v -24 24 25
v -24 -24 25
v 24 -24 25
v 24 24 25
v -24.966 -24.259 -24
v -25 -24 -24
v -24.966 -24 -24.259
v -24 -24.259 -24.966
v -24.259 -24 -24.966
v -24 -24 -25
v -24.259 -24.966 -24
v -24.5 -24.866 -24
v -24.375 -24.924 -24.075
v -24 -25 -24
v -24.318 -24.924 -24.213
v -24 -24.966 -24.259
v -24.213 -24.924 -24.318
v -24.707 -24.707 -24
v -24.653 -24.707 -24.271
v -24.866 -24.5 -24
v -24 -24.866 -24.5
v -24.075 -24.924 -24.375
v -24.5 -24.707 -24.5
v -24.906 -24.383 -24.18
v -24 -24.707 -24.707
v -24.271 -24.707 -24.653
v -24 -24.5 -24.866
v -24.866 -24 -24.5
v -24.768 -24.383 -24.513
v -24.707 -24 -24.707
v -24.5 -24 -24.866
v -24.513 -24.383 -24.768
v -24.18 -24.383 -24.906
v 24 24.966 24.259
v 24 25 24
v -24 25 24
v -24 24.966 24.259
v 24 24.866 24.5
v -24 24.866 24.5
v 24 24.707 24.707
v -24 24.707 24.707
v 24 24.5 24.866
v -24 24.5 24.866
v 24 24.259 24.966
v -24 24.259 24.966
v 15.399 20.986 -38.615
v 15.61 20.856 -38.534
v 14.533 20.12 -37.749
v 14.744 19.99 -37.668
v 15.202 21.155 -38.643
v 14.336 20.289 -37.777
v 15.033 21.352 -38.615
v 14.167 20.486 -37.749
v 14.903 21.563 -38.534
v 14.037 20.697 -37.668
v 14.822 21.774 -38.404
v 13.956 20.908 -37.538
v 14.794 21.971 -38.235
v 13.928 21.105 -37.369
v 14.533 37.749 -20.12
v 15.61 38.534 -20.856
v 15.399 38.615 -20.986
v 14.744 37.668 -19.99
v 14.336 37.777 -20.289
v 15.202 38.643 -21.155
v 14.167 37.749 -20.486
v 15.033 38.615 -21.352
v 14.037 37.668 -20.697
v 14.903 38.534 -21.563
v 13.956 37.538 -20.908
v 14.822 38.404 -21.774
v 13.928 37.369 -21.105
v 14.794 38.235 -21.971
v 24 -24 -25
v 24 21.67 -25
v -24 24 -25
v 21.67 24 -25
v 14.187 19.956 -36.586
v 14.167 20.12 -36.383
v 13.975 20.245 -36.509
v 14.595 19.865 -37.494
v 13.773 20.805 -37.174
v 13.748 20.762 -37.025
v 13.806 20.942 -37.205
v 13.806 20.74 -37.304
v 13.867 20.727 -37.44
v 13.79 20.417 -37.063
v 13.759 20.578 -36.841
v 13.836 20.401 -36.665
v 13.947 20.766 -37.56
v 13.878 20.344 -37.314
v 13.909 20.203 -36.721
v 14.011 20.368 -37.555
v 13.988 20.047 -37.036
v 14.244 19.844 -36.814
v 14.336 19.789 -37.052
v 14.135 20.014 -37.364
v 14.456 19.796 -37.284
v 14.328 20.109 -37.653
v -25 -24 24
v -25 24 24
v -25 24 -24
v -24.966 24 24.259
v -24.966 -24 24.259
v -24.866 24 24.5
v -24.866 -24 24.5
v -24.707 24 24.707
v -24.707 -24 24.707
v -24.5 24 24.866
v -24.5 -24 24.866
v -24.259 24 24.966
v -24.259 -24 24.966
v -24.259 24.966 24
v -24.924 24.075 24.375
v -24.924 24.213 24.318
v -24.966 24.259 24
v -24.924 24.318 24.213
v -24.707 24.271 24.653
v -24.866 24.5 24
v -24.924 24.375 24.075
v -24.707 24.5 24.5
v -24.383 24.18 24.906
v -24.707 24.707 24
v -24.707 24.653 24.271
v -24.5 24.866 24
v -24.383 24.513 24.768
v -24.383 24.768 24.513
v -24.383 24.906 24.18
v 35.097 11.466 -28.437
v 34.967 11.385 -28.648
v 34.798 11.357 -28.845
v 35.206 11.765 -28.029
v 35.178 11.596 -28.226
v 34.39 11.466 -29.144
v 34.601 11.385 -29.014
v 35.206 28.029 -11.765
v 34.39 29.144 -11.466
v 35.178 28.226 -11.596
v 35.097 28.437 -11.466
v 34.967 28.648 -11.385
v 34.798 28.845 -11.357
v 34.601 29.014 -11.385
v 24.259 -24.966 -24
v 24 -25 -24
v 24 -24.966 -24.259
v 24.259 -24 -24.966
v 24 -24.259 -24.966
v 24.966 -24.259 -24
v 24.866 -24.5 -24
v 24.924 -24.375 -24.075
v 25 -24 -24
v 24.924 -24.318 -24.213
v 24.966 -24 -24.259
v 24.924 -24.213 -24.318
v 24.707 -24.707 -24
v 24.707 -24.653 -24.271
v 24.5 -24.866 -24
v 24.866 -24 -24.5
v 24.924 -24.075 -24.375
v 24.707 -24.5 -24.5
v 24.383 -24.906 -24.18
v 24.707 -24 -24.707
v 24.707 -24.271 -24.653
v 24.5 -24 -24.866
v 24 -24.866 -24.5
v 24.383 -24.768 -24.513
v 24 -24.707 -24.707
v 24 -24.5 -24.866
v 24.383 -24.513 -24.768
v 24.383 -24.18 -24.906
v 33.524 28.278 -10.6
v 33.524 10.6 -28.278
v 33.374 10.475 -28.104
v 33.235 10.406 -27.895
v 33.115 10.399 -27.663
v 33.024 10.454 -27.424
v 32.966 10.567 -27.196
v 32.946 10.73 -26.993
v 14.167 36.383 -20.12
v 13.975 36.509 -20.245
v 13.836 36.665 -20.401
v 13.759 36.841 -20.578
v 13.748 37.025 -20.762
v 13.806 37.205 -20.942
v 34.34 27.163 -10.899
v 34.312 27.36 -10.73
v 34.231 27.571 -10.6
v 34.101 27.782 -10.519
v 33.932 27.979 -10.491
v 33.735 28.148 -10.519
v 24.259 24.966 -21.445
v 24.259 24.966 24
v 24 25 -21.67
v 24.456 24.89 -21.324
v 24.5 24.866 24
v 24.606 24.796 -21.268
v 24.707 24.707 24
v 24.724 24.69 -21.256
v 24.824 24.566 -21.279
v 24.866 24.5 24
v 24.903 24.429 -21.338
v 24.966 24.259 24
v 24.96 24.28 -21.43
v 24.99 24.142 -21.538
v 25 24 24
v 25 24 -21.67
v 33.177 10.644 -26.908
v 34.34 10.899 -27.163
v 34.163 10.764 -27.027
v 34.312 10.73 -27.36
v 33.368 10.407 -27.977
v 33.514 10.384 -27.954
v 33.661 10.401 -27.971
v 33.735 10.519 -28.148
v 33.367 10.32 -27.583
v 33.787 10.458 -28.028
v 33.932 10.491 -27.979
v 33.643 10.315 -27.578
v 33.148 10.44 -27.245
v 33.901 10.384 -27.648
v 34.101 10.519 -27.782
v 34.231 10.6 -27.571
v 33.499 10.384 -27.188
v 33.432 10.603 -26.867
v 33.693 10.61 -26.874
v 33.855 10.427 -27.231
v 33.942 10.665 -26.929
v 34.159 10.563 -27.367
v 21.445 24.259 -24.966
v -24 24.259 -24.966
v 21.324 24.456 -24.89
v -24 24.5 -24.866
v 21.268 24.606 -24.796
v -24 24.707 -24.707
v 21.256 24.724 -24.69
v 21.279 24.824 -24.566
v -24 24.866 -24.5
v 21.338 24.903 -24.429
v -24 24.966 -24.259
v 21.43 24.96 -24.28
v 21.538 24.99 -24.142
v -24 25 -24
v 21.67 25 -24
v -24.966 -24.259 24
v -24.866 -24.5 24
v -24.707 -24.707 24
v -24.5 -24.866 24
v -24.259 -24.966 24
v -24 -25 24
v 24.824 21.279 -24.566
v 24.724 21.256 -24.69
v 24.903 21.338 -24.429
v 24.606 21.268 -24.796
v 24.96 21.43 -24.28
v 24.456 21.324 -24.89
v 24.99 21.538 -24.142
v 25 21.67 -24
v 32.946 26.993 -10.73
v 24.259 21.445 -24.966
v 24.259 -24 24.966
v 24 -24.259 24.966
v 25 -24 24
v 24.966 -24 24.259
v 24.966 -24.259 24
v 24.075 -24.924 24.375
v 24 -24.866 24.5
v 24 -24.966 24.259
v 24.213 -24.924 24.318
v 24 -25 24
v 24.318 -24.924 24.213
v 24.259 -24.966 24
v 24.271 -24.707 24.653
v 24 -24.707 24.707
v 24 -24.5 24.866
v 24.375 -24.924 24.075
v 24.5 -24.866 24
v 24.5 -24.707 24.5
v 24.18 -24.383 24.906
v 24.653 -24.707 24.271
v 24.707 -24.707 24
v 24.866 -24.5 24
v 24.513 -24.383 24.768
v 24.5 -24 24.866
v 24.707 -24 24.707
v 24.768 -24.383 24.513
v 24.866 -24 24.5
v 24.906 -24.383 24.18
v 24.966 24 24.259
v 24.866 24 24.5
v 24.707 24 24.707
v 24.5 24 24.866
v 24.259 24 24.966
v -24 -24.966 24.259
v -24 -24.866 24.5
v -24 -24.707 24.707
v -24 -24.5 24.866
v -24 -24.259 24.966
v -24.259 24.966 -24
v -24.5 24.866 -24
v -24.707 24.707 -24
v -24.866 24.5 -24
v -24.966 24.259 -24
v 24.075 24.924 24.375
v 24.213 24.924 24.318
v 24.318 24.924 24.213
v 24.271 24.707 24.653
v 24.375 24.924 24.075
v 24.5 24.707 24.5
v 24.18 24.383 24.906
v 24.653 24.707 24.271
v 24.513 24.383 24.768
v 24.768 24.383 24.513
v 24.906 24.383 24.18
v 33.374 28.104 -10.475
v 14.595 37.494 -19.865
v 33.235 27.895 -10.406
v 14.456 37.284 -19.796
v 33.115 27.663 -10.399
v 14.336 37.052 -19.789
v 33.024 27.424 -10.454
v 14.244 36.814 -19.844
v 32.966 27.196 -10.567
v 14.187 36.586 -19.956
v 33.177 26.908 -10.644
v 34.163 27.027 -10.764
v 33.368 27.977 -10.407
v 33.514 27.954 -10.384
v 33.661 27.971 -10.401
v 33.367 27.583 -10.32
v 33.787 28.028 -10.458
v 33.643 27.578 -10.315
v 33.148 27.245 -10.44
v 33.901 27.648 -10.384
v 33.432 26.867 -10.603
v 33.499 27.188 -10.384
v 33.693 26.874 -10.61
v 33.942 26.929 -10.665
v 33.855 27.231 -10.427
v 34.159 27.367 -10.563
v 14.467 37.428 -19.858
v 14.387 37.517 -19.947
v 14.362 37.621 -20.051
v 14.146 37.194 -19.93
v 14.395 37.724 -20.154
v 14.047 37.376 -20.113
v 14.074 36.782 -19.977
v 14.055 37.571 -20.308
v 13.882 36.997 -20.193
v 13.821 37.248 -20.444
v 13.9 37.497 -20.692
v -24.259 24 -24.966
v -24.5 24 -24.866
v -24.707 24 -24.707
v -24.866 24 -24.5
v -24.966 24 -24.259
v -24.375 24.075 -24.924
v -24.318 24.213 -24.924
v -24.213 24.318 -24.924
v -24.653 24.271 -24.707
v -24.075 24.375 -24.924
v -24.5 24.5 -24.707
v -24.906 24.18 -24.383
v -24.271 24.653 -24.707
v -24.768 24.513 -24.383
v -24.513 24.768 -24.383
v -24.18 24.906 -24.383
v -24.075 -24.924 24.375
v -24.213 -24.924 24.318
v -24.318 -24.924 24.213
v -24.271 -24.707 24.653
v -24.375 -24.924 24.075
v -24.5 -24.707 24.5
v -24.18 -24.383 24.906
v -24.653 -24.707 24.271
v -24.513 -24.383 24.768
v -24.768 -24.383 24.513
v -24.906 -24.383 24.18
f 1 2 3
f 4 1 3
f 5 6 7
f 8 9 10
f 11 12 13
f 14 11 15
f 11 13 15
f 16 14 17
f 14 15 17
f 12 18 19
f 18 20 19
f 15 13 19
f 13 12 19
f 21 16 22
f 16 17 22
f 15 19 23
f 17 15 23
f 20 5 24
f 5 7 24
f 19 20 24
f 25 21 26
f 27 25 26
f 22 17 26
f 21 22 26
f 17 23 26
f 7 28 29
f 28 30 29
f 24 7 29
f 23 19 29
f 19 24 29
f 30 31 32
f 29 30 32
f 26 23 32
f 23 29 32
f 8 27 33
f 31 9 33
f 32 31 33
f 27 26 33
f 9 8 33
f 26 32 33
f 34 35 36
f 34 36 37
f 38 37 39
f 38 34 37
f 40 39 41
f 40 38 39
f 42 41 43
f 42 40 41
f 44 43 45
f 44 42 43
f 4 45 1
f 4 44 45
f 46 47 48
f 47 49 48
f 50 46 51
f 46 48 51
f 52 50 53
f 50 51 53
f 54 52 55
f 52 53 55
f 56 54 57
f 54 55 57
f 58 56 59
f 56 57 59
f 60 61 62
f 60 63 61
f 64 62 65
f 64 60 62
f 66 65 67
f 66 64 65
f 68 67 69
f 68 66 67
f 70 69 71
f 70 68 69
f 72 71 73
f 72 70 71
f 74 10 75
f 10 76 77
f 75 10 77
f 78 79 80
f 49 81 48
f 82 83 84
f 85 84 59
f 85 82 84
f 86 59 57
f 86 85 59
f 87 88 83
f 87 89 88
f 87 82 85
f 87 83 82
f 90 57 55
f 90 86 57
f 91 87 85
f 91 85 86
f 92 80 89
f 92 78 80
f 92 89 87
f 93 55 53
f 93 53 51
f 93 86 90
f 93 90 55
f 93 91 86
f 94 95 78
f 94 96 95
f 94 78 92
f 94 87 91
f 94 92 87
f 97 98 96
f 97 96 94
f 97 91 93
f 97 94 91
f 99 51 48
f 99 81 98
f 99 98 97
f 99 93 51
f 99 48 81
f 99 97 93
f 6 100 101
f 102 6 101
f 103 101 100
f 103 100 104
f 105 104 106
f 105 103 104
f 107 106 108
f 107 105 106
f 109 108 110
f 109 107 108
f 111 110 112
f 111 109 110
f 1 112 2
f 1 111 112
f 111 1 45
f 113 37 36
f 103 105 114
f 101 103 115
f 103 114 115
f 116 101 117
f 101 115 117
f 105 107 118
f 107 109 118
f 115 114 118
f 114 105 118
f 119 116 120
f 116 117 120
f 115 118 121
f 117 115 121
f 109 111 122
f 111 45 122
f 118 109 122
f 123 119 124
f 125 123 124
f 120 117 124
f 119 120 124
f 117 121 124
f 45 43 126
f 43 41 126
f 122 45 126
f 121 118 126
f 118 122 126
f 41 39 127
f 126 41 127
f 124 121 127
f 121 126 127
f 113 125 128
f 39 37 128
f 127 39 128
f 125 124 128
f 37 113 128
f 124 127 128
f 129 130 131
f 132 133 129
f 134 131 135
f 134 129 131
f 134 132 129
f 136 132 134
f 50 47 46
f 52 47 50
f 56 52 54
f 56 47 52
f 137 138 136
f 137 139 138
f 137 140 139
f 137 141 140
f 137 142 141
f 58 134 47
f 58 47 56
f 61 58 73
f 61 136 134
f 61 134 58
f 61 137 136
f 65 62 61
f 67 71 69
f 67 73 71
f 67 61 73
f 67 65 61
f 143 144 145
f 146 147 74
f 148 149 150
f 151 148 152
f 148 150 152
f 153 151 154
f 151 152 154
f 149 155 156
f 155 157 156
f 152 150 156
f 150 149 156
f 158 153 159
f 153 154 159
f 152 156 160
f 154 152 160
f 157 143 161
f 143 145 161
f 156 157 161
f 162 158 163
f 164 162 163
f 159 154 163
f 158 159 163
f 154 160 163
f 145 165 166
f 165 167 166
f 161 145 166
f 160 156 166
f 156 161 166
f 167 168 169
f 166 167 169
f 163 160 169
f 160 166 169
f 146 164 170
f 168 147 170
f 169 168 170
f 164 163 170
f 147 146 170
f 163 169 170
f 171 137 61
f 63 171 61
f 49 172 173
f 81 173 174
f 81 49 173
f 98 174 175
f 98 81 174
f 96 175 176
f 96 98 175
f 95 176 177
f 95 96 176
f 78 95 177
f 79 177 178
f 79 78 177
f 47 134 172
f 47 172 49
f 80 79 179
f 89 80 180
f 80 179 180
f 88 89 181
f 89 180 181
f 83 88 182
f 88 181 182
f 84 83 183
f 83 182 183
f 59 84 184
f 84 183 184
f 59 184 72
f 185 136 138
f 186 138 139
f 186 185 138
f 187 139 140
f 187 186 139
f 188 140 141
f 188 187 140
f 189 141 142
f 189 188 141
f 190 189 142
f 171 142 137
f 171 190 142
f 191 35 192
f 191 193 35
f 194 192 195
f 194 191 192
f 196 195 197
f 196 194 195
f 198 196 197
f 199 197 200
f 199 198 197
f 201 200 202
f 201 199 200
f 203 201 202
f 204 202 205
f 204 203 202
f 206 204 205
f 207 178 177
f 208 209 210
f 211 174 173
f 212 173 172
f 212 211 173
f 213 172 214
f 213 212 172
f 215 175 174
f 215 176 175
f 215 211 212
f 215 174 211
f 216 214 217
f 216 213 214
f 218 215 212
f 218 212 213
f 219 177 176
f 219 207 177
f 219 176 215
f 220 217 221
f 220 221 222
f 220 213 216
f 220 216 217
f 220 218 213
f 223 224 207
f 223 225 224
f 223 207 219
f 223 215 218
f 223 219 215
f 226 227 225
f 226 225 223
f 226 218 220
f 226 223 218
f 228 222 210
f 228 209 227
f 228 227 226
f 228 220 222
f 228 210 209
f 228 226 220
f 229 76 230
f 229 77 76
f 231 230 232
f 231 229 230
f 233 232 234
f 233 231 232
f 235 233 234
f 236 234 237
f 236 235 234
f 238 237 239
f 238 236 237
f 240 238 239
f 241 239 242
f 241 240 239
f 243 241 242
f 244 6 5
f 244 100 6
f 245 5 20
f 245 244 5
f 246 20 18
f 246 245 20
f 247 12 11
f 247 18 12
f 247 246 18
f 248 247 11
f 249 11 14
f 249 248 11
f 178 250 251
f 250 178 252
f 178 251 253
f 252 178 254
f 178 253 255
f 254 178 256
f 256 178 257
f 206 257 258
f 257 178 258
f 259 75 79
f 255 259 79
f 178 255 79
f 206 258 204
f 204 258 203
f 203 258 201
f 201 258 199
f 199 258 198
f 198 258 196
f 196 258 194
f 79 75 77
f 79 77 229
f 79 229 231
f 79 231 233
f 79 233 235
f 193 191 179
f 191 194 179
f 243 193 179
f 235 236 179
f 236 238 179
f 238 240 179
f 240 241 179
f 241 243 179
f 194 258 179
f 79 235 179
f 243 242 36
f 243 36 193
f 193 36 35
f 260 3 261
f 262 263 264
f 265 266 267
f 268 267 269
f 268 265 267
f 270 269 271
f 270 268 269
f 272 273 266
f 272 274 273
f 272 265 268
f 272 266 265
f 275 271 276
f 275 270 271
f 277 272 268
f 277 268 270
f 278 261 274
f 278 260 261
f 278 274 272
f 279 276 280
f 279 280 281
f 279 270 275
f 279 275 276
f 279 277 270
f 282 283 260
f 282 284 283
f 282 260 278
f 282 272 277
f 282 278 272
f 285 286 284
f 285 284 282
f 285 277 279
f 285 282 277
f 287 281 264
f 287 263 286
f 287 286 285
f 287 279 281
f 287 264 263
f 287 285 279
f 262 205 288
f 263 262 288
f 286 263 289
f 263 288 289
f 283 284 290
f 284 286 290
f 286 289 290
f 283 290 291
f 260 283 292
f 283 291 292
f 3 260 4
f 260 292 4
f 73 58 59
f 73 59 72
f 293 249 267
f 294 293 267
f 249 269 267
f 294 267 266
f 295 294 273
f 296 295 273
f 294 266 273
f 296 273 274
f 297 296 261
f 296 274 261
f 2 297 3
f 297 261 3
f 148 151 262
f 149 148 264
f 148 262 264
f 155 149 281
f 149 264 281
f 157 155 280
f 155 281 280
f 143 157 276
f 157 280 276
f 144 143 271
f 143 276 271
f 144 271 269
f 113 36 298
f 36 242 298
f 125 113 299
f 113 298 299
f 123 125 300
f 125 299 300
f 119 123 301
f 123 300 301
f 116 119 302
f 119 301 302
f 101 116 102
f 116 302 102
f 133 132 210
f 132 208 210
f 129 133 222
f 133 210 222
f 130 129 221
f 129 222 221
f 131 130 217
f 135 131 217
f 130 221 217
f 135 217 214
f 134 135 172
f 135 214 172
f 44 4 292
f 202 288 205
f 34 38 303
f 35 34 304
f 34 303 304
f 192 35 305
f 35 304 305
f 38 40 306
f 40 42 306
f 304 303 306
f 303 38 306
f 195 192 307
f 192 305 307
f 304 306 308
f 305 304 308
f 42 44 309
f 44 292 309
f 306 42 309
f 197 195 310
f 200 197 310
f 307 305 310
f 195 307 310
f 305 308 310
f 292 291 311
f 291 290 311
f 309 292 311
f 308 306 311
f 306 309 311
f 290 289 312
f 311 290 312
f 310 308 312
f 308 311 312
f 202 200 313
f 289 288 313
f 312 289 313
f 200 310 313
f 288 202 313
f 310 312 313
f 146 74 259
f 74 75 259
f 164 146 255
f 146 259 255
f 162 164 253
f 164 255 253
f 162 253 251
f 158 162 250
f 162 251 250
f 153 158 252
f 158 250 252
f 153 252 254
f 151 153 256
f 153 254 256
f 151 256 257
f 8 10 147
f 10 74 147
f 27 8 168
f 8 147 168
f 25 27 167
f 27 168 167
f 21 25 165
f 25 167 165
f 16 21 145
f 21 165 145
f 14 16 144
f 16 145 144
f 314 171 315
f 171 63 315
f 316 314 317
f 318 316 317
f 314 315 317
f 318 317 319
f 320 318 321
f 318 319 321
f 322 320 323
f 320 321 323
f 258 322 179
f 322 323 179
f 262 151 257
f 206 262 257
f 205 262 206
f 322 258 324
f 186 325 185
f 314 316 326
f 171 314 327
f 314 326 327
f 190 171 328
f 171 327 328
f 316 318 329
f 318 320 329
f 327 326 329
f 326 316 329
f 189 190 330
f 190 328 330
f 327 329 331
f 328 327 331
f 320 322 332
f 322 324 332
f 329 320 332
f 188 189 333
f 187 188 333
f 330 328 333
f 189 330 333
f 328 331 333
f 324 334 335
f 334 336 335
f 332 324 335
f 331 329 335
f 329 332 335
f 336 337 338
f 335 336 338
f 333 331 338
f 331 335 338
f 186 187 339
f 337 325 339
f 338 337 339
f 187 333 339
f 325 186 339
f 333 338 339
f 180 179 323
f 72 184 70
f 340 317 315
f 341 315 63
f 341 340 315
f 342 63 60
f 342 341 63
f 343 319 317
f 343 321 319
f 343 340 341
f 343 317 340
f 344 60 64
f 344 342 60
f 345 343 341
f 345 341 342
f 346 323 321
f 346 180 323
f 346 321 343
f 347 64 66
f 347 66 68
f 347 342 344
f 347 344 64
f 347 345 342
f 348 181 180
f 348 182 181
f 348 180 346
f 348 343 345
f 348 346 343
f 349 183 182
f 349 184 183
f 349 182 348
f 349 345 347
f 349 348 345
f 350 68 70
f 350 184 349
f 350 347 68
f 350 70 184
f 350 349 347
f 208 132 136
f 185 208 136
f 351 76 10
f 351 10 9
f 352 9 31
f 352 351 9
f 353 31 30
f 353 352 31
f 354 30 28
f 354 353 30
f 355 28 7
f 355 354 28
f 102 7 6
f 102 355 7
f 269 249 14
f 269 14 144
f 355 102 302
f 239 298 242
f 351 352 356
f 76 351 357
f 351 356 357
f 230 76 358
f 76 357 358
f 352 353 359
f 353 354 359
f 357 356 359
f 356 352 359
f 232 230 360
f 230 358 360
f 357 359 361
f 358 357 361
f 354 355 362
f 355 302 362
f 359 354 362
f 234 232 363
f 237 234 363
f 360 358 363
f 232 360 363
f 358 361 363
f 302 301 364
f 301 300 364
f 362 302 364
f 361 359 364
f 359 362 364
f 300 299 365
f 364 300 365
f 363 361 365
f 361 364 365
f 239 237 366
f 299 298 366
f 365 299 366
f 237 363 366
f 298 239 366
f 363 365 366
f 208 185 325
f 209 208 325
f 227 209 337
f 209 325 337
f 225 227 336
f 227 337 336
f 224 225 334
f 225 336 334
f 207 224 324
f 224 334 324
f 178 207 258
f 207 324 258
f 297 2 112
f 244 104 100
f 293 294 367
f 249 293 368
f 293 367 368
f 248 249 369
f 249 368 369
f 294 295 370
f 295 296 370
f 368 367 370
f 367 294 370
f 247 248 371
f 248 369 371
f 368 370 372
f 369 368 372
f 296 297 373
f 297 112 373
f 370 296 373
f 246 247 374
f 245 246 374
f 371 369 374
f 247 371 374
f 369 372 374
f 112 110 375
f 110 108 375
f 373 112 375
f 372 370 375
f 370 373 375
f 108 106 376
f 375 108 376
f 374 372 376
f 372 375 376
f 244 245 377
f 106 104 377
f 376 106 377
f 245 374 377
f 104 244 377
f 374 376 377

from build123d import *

# Parameters (mm, degrees)
F0_W     = 50
F0_H     = 50
F1_DEPTH = 25
F4_W     = 25
F4_H     = 25
F5_DEPTH = 2.5
F6_R     = 1


with BuildPart() as f1:
    # F0 (on Top) → F1 (new body, symmetric)
    with BuildSketch(Plane.XY):
        Rectangle(F0_W, F0_H)
    extrude(amount=F1_DEPTH, both=True)

    # F4 (on plane+point) → F5 (join)
    with BuildSketch(Plane(origin=(25, 25, -25), x_dir=(-0.8164965809, 0.4082482905, -0.4082482905), z_dir=(0.5773502692, 0.5773502692, -0.5773502692))):
        Rectangle(F4_W, F4_H)
    extrude(amount=-F5_DEPTH)

    # F6
    f6_edges = [f1.edges().sort_by_distance(p)[0] for p in [
        (25, 0, 25),
        (0, 25, 25),
        (-25, 0, 25),
        (0, -25, 25),
        (-25, 25, 0),
        (-25, 0, -25),
        (-25, -25, 0),
        (0, -25, -25),
        (25, -25, 0),
        (-2.165064, 25, -25),
        (25, -2.165064, -25),
        (25, 25, 2.165064),
        (33.762832, 18.453521, -18.453521),
        (23.556624, 14.71779, -32.395459),
        (13.350417, 28.659728, -28.659728),
        (23.556624, 32.395459, -14.71779),
        (34.484519, 28.014043, -10.336374),
        (14.072105, 38.220251, -20.542581),
        (34.484519, 10.336374, -28.014043),
        (14.072105, 20.542581, -38.220251),
    ]]
    fillet(f6_edges, radius=F6_R)


solid = f1.part
